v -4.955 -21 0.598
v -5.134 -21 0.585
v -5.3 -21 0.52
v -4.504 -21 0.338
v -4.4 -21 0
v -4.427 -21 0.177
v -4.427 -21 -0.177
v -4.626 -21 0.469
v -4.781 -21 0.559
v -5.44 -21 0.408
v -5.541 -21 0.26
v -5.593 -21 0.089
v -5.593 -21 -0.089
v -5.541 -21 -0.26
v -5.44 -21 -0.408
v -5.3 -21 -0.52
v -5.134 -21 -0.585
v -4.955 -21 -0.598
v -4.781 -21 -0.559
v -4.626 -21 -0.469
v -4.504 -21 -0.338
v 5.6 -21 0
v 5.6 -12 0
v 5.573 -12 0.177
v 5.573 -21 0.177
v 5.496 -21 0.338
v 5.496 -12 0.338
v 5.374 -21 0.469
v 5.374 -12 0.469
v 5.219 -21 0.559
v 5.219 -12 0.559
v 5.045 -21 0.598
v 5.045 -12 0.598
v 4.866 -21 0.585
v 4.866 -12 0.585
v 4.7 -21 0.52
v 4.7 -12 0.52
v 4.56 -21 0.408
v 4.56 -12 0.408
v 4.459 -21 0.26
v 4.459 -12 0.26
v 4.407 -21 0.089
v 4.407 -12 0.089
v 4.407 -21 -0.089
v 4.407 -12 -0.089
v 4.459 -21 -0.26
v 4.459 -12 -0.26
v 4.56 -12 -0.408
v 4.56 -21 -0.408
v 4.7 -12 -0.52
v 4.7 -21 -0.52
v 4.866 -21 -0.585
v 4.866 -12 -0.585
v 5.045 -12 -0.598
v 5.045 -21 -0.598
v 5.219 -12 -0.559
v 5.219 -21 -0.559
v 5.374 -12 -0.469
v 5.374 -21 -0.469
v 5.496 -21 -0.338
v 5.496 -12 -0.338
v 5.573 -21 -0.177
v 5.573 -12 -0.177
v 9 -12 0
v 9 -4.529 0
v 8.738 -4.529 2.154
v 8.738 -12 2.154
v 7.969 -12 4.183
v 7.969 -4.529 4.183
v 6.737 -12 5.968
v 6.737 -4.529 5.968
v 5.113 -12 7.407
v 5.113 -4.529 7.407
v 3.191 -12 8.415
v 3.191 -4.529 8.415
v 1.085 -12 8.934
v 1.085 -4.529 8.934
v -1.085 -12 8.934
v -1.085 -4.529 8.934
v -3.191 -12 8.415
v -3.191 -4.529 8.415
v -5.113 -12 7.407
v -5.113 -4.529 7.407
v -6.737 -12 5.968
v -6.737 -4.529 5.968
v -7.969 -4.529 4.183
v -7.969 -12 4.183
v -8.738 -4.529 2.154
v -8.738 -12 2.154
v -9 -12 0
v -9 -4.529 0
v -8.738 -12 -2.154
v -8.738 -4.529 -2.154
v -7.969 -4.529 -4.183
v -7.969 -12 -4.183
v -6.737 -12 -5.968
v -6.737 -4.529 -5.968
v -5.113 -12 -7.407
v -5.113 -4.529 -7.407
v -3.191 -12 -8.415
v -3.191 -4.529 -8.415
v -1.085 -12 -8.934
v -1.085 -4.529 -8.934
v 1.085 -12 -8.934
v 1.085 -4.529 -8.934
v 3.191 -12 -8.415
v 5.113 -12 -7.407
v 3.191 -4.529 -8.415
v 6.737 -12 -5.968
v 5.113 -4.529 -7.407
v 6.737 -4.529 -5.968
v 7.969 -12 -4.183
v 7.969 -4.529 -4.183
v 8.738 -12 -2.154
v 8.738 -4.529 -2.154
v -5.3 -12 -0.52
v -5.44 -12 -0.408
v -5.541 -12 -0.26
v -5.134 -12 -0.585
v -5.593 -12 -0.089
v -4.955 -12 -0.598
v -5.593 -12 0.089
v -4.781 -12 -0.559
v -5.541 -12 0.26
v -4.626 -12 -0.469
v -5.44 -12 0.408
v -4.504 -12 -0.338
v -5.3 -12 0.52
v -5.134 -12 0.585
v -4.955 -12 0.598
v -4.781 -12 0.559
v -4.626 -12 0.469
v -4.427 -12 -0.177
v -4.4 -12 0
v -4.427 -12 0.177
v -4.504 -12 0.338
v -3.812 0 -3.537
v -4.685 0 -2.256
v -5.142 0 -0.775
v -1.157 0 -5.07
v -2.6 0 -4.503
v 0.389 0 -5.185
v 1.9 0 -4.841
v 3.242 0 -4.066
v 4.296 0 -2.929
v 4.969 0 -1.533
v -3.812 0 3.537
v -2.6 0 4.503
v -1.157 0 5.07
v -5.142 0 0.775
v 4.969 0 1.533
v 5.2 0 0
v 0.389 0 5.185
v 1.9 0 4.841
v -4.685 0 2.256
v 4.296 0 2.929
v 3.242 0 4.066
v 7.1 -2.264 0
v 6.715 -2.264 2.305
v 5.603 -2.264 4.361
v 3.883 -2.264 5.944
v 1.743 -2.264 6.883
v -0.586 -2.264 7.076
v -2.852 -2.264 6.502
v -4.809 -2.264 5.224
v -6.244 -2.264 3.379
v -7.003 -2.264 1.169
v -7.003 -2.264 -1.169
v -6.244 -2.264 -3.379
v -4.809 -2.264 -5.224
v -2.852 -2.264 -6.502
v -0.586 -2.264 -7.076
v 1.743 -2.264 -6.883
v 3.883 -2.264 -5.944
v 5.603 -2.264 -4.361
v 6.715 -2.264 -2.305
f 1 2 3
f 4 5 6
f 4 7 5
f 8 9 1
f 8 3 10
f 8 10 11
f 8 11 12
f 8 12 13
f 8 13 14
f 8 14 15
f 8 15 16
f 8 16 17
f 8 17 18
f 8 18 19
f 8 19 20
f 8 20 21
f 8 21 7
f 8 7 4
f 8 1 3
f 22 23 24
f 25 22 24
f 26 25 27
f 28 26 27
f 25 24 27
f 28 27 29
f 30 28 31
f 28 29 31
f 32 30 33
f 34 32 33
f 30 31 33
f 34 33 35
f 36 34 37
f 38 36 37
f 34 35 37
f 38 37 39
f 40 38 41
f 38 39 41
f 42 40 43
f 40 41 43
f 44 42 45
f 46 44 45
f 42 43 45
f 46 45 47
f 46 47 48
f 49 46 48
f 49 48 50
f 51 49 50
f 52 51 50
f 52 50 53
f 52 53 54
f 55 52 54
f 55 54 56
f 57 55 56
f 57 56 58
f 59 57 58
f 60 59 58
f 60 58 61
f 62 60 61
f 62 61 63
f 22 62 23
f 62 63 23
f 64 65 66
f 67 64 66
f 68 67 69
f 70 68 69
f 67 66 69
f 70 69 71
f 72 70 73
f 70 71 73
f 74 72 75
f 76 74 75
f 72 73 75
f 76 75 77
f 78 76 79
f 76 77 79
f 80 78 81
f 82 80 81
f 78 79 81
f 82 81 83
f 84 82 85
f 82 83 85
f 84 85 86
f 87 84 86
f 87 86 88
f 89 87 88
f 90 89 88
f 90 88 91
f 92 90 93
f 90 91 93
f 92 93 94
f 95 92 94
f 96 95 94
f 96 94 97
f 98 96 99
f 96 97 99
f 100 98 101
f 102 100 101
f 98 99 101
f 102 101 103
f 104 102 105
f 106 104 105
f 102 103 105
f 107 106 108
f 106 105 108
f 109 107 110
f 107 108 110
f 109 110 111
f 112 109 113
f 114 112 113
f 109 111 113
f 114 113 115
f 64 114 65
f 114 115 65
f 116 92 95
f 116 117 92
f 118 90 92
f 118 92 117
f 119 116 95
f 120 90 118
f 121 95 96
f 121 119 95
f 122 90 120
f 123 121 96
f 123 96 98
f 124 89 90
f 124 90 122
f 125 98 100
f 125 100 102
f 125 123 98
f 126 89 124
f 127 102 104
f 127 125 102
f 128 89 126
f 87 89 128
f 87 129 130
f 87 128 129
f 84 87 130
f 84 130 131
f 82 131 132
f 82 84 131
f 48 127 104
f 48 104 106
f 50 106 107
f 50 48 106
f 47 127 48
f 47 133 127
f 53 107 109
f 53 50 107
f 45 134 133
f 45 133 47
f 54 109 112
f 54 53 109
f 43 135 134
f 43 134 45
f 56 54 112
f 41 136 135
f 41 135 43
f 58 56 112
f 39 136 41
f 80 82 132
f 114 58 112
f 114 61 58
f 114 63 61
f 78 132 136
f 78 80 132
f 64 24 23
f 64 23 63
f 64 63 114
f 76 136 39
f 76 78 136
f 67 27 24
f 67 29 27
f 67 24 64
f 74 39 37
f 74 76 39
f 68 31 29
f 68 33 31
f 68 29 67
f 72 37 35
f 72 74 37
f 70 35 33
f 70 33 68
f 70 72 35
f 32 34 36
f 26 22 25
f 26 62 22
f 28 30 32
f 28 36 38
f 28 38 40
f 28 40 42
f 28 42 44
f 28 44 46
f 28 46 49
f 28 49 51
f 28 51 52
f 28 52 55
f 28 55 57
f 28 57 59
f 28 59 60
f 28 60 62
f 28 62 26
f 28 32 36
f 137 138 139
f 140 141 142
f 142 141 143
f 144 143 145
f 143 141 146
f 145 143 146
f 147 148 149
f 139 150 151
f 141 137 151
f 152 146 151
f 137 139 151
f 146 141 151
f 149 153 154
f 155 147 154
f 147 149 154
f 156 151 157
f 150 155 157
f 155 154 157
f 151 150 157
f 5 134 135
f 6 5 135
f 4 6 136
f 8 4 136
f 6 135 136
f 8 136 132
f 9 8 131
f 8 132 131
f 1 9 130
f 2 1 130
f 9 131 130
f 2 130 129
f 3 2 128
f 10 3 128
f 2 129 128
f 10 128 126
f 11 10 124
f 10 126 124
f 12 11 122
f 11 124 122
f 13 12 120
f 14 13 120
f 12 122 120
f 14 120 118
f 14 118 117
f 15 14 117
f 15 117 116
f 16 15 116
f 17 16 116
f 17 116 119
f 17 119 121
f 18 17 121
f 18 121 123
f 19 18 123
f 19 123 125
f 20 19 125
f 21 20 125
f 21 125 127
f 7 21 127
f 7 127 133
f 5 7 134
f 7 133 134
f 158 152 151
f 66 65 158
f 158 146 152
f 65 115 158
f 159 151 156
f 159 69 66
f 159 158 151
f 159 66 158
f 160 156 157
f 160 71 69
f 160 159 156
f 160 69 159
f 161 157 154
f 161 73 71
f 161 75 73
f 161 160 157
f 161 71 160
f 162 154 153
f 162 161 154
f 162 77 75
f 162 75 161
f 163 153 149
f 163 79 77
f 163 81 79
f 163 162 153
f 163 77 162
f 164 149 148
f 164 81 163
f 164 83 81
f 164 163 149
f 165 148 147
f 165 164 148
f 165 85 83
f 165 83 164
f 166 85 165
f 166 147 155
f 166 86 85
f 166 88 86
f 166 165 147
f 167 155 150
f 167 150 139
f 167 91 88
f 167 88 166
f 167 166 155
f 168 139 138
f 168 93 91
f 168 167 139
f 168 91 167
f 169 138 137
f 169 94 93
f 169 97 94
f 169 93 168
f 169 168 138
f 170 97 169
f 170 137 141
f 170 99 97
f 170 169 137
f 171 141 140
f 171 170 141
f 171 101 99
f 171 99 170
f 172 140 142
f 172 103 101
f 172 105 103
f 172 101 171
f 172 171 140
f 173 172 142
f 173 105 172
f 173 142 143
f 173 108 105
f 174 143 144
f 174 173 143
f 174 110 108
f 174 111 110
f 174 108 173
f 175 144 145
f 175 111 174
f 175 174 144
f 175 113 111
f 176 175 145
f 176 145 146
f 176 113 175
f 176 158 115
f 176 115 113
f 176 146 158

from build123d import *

# Parameters (mm, degrees)
F0_R     = 9
F1_DEPTH = 12
F2_SIZE2 = 4.5286636519
F2_SIZE  = 3.8
F3_R     = 0.6
F4_DEPTH = 9


with BuildPart() as f1:
    # F0 (on Front) → F1 (new body)
    with BuildSketch(Plane.XZ):
        Circle(F0_R)
    extrude(amount=F1_DEPTH)

    # F2
    f2_edges = [f1.edges().sort_by_distance(p)[0] for p in [
        (-9, 0, 0),
    ]]
    f2_side = f1.faces().sort_by_distance((0, 0, 0))[0]
    chamfer(f2_edges, length=F2_SIZE, length2=F2_SIZE2, reference=f2_side)

    # F3 (on face) → F4 (join)
    with BuildSketch(Plane.XZ.offset(12)):
        with Locations((-5, 0)):
            Circle(F3_R)
        with Locations((5, 0)):
            Circle(F3_R)
    extrude(amount=F4_DEPTH)


solid = f1.part
